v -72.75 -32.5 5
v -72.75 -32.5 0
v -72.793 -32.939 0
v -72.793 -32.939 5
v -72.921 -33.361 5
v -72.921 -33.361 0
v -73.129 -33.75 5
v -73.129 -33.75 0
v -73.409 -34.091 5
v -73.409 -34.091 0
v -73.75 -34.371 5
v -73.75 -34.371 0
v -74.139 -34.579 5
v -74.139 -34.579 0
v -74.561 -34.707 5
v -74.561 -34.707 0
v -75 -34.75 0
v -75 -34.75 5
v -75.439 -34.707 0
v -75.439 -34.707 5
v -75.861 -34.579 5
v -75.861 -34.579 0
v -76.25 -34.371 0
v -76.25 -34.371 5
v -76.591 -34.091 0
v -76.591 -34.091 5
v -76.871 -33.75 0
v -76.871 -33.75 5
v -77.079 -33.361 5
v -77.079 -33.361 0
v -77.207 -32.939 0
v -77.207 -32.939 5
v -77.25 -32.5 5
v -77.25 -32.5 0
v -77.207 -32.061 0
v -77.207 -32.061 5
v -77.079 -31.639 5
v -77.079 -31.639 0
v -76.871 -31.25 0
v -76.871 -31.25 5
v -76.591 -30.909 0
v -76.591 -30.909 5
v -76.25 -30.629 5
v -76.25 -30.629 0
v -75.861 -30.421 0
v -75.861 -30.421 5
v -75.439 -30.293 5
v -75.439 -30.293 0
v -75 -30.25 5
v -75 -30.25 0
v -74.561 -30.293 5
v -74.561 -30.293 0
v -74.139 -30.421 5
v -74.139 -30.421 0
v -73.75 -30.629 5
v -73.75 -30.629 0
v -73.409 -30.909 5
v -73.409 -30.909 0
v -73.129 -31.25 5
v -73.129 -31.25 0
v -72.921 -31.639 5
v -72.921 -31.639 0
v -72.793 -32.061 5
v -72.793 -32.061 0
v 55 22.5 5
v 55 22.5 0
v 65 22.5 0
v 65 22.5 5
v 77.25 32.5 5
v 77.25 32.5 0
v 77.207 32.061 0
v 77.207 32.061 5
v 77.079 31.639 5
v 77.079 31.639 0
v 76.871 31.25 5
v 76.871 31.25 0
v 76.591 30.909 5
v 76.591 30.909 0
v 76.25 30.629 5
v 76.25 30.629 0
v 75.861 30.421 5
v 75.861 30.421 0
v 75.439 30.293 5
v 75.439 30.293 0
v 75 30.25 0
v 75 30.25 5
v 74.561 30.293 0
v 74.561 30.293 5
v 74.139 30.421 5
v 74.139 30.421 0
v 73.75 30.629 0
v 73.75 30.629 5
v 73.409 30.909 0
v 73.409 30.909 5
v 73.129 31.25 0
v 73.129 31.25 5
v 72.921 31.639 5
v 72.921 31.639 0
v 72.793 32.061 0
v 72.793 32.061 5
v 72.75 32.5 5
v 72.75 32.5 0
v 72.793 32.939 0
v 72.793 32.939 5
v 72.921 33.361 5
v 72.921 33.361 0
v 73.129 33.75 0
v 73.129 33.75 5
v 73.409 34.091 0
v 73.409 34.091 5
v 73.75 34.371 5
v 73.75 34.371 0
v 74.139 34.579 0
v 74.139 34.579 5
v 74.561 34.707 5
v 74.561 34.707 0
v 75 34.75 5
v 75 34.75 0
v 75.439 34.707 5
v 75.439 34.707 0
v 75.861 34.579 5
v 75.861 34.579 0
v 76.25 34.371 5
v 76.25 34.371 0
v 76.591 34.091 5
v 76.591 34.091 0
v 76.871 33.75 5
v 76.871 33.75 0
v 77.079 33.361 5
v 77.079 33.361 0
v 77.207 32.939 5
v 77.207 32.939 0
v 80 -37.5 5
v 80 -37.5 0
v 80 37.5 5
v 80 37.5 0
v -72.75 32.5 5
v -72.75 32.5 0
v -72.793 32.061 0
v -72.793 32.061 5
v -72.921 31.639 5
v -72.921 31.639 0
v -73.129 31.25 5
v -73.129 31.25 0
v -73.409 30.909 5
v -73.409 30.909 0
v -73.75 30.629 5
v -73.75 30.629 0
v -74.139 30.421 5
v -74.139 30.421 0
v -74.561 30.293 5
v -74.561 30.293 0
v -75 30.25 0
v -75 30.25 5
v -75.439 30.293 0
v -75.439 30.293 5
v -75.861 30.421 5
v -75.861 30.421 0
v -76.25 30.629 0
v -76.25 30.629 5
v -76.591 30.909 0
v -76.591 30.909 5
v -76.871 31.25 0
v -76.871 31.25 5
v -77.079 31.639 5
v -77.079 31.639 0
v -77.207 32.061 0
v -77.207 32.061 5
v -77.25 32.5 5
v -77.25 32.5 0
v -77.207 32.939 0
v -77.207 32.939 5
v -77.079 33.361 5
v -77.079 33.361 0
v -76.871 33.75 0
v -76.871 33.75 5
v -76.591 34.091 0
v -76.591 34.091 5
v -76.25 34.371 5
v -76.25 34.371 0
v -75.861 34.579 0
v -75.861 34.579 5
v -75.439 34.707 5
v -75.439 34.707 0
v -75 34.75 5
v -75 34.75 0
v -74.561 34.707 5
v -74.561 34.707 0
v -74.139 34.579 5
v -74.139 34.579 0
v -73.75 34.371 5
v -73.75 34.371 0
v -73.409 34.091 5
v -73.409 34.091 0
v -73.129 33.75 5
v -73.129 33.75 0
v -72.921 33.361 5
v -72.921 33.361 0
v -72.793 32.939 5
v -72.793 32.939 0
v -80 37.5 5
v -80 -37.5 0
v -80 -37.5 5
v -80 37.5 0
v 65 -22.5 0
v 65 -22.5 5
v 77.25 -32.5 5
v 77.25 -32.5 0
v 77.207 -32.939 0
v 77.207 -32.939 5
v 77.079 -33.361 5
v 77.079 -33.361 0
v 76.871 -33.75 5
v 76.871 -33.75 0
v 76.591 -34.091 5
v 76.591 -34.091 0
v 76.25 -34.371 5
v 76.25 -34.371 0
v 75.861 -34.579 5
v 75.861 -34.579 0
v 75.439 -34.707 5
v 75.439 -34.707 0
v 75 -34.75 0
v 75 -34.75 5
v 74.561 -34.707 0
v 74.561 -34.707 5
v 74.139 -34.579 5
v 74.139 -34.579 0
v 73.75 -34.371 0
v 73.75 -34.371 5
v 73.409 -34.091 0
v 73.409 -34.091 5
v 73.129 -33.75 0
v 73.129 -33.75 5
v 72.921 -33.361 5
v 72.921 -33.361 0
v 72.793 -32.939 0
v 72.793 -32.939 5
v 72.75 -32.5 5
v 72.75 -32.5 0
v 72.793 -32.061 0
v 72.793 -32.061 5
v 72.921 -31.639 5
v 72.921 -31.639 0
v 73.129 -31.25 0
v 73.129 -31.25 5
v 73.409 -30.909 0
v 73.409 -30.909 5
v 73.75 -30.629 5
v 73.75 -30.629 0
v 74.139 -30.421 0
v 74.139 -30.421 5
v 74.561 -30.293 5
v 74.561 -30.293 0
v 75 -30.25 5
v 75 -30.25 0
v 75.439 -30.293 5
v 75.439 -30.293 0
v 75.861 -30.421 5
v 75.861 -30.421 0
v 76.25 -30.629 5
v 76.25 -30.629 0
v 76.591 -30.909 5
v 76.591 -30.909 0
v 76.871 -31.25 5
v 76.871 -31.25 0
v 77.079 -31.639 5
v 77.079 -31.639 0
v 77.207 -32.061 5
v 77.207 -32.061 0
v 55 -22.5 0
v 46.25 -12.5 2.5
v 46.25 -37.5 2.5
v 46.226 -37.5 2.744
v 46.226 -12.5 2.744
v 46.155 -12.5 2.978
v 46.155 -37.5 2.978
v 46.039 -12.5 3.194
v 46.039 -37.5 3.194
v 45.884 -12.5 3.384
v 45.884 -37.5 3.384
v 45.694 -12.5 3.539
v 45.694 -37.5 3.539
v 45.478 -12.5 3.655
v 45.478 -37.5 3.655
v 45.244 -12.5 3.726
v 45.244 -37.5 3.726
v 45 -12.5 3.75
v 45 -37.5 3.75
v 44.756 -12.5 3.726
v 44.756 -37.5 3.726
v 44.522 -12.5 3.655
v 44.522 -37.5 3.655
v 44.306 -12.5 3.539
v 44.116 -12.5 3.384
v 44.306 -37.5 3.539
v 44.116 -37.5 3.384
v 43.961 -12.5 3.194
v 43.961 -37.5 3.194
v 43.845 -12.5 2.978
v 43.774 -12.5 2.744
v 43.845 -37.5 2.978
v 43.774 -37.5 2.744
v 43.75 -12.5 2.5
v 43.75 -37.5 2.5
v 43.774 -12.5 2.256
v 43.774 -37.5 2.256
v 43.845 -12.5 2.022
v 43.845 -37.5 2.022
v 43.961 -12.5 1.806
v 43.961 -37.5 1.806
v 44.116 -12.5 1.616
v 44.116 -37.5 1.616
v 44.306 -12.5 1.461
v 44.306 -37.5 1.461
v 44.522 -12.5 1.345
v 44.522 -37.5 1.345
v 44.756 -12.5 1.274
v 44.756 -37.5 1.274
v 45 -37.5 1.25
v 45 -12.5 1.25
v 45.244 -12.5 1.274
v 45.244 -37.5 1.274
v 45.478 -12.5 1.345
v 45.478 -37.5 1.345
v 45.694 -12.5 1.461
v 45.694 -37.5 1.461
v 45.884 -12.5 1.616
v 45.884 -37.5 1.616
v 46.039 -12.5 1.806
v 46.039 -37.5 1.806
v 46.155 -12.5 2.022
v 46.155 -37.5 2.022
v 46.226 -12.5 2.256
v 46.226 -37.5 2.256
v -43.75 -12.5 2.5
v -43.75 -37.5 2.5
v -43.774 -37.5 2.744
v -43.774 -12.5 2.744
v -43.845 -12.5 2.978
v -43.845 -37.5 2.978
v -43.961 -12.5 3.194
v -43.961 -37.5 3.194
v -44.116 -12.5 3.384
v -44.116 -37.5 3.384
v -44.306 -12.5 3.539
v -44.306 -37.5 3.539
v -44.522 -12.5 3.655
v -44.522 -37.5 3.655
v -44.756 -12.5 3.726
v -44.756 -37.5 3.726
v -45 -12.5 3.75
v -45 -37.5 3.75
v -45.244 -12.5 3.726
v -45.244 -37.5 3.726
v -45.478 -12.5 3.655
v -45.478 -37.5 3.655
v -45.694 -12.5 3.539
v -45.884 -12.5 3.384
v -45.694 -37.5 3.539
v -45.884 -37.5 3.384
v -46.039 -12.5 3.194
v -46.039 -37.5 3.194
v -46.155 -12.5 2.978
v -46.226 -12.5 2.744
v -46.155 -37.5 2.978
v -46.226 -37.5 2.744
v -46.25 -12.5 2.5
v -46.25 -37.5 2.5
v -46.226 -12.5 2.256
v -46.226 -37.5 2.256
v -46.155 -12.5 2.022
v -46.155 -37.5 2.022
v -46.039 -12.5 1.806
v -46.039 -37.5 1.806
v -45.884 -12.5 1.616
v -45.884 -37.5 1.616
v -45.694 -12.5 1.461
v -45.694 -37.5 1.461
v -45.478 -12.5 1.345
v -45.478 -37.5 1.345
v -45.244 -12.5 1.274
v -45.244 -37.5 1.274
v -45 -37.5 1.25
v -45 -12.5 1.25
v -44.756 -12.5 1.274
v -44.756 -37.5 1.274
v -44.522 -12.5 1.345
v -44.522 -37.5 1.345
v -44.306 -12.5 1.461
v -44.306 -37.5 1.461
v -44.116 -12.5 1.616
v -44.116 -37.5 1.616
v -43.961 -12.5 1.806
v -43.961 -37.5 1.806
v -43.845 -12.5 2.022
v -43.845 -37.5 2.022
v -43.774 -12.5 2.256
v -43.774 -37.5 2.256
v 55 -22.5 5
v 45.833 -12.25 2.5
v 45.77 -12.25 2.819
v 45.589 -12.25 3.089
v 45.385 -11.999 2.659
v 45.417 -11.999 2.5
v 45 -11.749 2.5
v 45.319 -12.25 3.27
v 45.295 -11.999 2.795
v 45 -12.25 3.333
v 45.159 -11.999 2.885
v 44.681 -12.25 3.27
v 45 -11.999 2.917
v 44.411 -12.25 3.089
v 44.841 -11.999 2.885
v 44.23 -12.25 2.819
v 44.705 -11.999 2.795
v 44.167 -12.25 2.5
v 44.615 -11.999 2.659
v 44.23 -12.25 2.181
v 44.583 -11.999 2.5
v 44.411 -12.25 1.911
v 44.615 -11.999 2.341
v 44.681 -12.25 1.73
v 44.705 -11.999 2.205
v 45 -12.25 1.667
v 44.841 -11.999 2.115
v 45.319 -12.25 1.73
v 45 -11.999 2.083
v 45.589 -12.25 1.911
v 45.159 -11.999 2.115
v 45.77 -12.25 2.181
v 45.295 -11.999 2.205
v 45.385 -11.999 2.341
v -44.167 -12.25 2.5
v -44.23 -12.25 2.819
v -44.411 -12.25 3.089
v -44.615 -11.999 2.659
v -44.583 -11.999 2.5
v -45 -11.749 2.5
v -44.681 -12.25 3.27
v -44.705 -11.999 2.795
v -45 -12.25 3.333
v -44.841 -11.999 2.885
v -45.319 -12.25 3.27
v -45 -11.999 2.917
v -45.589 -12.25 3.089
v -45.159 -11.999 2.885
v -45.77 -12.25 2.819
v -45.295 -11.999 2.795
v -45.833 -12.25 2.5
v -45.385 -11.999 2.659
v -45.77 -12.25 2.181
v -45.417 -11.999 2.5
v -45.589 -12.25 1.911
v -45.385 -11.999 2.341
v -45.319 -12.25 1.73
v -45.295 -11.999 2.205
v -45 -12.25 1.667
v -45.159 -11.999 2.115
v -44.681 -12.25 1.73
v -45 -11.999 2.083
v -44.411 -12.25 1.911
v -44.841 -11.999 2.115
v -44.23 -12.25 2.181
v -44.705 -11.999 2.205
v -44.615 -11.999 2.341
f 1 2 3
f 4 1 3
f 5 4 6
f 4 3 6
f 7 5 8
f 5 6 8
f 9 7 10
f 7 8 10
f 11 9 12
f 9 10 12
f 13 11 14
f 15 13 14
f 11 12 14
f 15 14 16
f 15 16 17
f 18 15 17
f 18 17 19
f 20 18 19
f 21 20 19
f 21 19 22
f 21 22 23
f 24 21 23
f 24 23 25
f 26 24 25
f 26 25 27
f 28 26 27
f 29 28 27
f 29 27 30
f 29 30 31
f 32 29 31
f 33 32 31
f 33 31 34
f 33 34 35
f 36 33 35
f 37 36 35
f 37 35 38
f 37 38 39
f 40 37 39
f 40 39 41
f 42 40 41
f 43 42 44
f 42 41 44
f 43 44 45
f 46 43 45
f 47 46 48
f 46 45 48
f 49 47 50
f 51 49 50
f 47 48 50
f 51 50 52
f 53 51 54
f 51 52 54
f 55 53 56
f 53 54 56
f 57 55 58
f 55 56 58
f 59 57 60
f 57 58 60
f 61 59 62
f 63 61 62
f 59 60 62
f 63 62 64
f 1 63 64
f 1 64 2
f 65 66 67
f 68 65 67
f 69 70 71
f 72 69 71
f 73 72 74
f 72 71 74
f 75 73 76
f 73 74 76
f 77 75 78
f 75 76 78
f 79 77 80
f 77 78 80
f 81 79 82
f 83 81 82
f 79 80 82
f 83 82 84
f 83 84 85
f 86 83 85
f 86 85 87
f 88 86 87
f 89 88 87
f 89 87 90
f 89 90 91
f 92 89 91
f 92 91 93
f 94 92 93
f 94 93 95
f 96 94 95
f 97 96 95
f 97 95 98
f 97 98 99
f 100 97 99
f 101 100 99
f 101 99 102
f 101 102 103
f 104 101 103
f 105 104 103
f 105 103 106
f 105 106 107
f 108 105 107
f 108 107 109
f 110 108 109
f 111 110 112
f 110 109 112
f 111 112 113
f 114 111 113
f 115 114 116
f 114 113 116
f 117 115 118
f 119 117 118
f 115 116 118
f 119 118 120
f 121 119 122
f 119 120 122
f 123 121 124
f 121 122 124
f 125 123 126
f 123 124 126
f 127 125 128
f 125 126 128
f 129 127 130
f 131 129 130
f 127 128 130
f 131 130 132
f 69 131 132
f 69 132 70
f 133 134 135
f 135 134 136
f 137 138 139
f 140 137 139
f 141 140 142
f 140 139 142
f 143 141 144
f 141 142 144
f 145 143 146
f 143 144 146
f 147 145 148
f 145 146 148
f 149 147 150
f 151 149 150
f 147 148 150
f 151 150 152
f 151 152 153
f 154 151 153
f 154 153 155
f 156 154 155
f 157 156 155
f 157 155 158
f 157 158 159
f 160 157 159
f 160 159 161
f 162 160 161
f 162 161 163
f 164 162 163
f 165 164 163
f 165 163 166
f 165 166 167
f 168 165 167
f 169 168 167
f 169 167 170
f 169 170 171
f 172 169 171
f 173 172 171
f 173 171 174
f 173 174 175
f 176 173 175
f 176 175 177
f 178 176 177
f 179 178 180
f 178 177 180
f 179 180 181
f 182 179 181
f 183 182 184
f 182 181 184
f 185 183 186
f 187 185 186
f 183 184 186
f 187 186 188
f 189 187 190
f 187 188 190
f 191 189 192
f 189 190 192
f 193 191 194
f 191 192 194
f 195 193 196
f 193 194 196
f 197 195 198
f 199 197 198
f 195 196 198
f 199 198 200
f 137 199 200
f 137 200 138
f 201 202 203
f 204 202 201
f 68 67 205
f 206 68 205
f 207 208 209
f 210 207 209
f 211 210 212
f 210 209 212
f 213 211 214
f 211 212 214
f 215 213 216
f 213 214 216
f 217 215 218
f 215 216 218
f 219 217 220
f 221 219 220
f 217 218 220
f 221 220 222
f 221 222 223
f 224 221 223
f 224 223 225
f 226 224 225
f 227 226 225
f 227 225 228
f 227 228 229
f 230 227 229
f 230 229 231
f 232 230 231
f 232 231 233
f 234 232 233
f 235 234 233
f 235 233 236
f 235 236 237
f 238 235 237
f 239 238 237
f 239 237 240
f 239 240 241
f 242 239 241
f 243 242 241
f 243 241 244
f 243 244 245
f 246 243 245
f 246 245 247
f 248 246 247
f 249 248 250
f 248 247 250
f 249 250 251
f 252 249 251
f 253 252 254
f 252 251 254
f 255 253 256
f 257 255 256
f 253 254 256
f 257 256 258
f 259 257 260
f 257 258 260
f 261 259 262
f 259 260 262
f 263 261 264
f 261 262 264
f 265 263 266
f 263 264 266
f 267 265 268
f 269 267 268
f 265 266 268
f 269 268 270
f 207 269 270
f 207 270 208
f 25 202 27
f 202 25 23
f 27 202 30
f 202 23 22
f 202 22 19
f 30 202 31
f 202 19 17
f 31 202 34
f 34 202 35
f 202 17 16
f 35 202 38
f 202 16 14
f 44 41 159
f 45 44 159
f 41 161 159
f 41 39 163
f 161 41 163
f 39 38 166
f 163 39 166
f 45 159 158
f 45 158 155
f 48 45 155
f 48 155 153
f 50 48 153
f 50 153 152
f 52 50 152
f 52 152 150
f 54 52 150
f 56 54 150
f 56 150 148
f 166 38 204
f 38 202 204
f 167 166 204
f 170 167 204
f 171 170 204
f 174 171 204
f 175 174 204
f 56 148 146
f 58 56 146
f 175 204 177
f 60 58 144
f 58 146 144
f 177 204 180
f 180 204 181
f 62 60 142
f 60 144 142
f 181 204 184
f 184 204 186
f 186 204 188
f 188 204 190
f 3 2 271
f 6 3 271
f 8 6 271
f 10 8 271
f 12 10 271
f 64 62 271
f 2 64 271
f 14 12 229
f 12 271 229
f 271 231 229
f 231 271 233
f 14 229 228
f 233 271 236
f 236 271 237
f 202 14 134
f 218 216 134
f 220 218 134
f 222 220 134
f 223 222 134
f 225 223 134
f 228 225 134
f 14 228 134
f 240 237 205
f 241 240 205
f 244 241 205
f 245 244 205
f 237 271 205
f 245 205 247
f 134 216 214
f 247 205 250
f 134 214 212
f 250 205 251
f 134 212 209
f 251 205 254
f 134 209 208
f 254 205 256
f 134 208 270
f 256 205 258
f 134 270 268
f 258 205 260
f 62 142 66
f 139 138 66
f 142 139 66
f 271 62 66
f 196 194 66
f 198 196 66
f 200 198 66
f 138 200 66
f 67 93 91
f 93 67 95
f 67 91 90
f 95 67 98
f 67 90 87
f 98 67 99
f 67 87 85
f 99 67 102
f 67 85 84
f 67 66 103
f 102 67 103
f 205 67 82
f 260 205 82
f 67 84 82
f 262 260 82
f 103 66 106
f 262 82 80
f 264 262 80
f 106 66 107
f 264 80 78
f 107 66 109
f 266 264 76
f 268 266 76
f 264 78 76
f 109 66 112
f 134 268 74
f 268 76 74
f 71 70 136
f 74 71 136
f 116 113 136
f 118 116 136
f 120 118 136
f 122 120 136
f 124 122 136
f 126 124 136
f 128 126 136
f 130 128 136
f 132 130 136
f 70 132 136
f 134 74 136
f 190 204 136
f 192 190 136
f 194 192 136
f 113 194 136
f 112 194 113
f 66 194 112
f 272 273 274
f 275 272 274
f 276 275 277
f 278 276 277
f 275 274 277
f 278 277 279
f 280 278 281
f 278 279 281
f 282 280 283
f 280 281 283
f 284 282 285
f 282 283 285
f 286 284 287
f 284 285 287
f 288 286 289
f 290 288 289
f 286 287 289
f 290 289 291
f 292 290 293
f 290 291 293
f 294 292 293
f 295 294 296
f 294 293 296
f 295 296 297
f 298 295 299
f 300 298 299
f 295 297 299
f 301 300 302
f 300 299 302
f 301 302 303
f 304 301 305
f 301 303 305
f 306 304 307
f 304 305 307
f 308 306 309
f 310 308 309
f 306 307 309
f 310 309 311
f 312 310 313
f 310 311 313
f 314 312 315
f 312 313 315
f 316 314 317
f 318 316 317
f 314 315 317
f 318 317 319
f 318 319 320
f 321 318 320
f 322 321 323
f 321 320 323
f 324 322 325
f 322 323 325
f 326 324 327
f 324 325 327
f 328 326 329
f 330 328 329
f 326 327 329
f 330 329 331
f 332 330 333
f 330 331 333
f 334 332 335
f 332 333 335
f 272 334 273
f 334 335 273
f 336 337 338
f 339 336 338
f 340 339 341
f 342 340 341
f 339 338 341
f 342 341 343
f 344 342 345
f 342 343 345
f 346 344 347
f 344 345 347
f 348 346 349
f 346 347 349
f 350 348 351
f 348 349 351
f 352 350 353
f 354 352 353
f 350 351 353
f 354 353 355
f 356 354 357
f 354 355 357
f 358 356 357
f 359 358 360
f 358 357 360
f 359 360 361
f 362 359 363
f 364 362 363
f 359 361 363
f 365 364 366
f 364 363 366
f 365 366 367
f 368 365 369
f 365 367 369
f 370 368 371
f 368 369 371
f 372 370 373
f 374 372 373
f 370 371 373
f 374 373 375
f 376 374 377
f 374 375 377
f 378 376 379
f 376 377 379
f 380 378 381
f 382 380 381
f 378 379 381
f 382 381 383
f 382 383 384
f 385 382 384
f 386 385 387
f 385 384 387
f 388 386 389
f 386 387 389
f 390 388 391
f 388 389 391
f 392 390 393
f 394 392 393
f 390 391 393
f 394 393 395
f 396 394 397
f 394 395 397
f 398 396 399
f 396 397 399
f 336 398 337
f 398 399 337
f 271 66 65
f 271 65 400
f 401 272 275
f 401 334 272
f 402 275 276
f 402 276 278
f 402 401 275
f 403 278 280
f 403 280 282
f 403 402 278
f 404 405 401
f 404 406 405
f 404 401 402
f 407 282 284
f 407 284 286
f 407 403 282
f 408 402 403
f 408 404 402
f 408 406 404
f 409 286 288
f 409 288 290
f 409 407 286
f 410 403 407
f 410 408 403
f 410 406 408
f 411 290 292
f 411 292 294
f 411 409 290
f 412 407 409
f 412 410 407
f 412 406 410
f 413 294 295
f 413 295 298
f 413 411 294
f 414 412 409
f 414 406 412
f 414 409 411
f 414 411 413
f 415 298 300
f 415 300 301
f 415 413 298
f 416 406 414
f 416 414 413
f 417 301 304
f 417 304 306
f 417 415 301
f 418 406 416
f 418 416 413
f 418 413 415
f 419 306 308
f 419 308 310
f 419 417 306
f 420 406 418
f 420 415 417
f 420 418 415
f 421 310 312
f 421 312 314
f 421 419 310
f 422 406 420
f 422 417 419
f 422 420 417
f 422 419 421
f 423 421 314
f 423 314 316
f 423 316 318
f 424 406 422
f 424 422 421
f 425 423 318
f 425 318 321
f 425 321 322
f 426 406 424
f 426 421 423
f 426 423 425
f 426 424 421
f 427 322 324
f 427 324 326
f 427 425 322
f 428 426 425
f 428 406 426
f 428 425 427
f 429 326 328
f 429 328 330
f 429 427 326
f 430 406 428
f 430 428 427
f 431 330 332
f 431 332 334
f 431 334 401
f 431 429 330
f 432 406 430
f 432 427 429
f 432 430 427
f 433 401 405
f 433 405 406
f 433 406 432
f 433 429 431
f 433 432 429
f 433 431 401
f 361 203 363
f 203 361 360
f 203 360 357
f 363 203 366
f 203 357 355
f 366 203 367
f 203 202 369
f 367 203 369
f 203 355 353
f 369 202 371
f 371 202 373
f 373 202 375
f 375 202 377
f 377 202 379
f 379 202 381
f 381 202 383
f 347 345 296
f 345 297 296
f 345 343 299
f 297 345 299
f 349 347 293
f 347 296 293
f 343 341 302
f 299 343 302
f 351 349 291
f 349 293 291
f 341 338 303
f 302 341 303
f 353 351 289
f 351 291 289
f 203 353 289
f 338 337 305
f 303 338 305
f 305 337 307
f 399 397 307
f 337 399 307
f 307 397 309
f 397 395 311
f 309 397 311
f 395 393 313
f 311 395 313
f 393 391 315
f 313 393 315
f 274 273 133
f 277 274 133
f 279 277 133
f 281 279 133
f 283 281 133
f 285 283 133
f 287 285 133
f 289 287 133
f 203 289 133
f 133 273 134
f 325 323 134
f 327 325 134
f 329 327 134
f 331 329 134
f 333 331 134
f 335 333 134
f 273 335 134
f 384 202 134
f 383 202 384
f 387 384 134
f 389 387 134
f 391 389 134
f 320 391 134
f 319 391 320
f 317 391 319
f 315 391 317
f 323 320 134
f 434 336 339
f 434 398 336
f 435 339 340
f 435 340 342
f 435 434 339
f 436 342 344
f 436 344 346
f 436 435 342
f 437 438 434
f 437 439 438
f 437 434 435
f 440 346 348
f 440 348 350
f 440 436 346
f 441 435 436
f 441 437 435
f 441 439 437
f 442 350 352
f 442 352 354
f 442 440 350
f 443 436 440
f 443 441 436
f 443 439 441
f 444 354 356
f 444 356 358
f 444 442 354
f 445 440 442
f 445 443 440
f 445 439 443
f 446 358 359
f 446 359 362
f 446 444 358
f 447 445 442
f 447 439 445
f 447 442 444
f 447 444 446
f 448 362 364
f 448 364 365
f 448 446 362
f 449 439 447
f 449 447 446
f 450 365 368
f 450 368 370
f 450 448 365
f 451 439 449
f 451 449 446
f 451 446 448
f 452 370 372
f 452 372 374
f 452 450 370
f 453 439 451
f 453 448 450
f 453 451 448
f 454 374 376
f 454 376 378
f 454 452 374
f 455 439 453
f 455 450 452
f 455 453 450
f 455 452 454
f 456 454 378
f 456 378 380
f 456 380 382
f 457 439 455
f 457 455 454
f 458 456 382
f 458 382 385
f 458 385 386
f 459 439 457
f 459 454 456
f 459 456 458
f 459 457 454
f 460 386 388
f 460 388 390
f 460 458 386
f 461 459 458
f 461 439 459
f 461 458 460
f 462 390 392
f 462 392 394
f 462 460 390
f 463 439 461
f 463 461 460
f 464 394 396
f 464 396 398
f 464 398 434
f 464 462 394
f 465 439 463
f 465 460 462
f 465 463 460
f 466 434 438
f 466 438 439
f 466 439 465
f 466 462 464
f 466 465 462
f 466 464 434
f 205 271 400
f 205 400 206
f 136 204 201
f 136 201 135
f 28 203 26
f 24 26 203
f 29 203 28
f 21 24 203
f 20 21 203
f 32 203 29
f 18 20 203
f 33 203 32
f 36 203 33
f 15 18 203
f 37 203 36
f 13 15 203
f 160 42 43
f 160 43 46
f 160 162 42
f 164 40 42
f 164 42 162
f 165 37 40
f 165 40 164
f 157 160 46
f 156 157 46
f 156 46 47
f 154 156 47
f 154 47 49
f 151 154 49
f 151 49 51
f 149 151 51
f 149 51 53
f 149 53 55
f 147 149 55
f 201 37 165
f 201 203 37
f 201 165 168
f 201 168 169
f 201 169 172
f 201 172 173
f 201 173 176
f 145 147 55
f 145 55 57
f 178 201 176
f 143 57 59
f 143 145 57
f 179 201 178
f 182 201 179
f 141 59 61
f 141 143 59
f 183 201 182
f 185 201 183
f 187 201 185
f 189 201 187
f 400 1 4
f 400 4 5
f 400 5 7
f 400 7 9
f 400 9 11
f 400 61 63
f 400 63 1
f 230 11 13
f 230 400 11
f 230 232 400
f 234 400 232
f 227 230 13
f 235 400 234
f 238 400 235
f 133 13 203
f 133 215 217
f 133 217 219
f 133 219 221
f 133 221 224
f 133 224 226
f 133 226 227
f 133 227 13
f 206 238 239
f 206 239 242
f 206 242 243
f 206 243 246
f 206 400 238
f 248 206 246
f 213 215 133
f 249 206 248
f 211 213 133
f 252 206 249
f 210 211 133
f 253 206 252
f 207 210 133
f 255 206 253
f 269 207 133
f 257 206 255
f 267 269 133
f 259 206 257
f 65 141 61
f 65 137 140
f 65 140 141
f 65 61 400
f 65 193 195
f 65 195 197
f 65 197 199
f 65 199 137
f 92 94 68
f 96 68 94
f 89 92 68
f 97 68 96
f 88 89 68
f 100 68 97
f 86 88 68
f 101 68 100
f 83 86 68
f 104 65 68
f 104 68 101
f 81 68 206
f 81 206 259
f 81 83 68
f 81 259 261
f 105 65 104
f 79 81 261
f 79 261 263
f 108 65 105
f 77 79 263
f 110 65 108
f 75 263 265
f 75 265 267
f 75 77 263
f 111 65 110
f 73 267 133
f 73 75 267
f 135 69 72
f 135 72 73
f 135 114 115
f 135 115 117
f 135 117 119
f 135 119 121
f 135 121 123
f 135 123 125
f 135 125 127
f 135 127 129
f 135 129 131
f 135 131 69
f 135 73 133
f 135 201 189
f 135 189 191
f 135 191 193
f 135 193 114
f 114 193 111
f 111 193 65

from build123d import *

# Parameters (mm, degrees)
SKETCH_W       = 160
SKETCH_H       = 75
PAD_DEPTH      = 5
SKETCH001_R    = 2.25
HOLE_DEPTH     = 5.001
SKETCH002_R    = 1.25
HOLE001_DEPTH  = 25
HOLE001_TIPS_R = 1.25
SKETCH003_W    = 10
SKETCH003_H    = 45
POCKET_DEPTH   = 5


with BuildPart() as part:
    # Sketch → Pad (new body)
    with BuildSketch(Plane.XY):
        Rectangle(SKETCH_W, SKETCH_H)
    extrude(amount=PAD_DEPTH)

    # Sketch001 (on Face5 of Pad) → Hole (cut, through all)
    with BuildSketch(Plane(origin=(0, 0, 0), x_dir=(1, 0, 0), z_dir=(0, 0, -1))):
        with Locations((-75, 32.5)):
            Circle(SKETCH001_R)
        with Locations((75, 32.5)):
            Circle(SKETCH001_R)
        with Locations((75, -32.5)):
            Circle(SKETCH001_R)
        with Locations((-75, -32.5)):
            Circle(SKETCH001_R)
    extrude(amount=-HOLE_DEPTH, mode=Mode.SUBTRACT)

    # Sketch002 (on Face6 of Hole) → Hole001 (cut)
    with BuildSketch(Plane.XZ.offset(37.5)):
        with Locations((-45, 2.5)):
            Circle(SKETCH002_R)
        with Locations((45, 2.5)):
            Circle(SKETCH002_R)
    extrude(amount=-HOLE001_DEPTH, mode=Mode.SUBTRACT)

    # Hole001 tips → Hole001 tip 1 section 0
    with BuildSketch(Plane.XZ.offset(12.5), mode=Mode.PRIVATE) as hole001_tip_1_s0:
        with Locations((-45, 2.5)):
            Circle(HOLE001_TIPS_R)
    loft([hole001_tip_1_s0.sketch, Vertex(-45, -11.748924, 2.5)], mode=Mode.SUBTRACT)

    # Hole001 tips → Hole001 tip 2 section 0
    with BuildSketch(Plane.XZ.offset(12.5), mode=Mode.PRIVATE) as hole001_tip_2_s0:
        with Locations((45, 2.5)):
            Circle(HOLE001_TIPS_R)
    loft([hole001_tip_2_s0.sketch, Vertex(45, -11.748924, 2.5)], mode=Mode.SUBTRACT)

    # Sketch003 (on Face4 of Hole001) → Pocket (cut)
    with BuildSketch(Plane(origin=(0, 0, 0), x_dir=(1, 0, 0), z_dir=(0, 0, -1))):
        with Locations((60, 0)):
            Rectangle(SKETCH003_W, SKETCH003_H)
    extrude(amount=-POCKET_DEPTH, mode=Mode.SUBTRACT)


solid = part.part
